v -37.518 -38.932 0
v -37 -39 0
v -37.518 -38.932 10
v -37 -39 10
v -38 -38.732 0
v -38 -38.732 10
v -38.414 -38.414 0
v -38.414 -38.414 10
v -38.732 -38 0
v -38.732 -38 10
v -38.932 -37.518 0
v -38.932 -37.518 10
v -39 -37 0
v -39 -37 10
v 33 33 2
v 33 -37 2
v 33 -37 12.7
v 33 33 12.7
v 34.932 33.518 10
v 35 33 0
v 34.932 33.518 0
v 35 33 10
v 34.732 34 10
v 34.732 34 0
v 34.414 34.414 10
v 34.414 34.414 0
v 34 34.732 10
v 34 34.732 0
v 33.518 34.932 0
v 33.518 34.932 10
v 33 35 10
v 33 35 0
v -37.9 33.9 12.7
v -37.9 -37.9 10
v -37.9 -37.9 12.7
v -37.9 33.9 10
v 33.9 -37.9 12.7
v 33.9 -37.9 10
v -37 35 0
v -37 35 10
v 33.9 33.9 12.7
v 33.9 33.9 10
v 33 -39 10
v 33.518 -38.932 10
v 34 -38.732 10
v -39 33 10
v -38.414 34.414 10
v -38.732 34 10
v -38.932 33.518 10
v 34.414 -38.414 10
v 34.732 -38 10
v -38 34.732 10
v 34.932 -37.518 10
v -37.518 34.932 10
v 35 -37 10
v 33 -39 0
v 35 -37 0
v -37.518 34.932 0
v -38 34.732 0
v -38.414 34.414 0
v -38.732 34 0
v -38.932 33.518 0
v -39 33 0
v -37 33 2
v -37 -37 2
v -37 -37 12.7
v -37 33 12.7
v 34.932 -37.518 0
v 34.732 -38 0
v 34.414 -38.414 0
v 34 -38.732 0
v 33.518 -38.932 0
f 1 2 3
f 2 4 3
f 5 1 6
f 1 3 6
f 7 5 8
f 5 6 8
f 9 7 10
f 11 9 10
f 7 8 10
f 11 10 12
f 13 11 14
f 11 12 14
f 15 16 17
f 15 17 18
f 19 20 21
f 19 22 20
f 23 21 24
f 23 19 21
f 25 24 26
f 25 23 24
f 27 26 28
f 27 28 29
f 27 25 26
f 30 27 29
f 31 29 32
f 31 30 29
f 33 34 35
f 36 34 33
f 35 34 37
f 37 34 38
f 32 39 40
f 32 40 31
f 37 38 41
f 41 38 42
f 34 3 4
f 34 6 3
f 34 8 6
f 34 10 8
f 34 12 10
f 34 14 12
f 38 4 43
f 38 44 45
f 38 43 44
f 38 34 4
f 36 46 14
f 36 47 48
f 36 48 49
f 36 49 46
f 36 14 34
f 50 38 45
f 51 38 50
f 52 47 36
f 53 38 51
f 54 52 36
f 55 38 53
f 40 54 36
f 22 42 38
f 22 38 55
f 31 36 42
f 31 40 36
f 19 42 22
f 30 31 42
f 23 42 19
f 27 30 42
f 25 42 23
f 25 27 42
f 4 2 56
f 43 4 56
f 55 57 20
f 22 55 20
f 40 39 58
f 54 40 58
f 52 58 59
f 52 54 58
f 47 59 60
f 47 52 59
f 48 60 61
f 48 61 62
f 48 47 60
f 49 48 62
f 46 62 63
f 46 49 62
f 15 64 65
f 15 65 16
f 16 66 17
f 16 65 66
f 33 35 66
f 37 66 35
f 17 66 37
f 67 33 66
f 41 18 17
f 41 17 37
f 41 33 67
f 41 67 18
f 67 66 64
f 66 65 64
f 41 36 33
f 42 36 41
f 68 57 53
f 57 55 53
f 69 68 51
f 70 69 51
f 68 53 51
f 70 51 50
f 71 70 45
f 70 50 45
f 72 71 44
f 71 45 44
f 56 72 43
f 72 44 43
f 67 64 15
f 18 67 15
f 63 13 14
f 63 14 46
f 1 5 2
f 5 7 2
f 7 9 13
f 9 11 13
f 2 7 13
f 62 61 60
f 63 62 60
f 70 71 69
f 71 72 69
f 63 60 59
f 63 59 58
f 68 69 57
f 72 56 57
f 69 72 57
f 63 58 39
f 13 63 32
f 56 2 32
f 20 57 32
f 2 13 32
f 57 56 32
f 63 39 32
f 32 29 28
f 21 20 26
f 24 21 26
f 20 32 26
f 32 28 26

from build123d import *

# Parameters (mm, degrees)
F0_W     = 74
F0_H     = 74
F0_W_2   = 70
F0_H_2   = 70
F1_DEPTH = 10
F2_DEPTH = 2
F3_W     = 71.8
F3_H     = 71.8
F3_W_2   = 70
F3_H_2   = 70
F4_DEPTH = 2.7
F5_R     = 2


with BuildPart() as f1:
    # F0 (on Top) → F1 (new body)
    with BuildSketch(Plane.XY):
        with Locations((-2, -2)):
            Rectangle(F0_W, F0_H)
        with Locations((-2, -2)):
            Rectangle(F0_W_2, F0_H_2, mode=Mode.SUBTRACT)
    extrude(amount=F1_DEPTH)

    # F0 (on Top) → F2 (join)
    with BuildSketch(Plane.XY):
        with Locations((-2, -2)):
            Rectangle(F0_W_2, F0_H_2)
    extrude(amount=F2_DEPTH)

    # F3 (on face) → F4 (join)
    with BuildSketch(Plane.XY.offset(10)):
        with Locations((-2, -2)):
            Rectangle(F3_W, F3_H)
        with Locations((-2, -2)):
            Rectangle(F3_W_2, F3_H_2, mode=Mode.SUBTRACT)
    extrude(amount=F4_DEPTH)

    # F5
    f5_edges = [f1.edges().sort_by_distance(p)[0] for p in [
        (-39, -39, 5),
        (35, -39, 5),
        (35, 35, 5),
        (-39, 35, 5),
    ]]
    fillet(f5_edges, radius=F5_R)


solid = f1.part
